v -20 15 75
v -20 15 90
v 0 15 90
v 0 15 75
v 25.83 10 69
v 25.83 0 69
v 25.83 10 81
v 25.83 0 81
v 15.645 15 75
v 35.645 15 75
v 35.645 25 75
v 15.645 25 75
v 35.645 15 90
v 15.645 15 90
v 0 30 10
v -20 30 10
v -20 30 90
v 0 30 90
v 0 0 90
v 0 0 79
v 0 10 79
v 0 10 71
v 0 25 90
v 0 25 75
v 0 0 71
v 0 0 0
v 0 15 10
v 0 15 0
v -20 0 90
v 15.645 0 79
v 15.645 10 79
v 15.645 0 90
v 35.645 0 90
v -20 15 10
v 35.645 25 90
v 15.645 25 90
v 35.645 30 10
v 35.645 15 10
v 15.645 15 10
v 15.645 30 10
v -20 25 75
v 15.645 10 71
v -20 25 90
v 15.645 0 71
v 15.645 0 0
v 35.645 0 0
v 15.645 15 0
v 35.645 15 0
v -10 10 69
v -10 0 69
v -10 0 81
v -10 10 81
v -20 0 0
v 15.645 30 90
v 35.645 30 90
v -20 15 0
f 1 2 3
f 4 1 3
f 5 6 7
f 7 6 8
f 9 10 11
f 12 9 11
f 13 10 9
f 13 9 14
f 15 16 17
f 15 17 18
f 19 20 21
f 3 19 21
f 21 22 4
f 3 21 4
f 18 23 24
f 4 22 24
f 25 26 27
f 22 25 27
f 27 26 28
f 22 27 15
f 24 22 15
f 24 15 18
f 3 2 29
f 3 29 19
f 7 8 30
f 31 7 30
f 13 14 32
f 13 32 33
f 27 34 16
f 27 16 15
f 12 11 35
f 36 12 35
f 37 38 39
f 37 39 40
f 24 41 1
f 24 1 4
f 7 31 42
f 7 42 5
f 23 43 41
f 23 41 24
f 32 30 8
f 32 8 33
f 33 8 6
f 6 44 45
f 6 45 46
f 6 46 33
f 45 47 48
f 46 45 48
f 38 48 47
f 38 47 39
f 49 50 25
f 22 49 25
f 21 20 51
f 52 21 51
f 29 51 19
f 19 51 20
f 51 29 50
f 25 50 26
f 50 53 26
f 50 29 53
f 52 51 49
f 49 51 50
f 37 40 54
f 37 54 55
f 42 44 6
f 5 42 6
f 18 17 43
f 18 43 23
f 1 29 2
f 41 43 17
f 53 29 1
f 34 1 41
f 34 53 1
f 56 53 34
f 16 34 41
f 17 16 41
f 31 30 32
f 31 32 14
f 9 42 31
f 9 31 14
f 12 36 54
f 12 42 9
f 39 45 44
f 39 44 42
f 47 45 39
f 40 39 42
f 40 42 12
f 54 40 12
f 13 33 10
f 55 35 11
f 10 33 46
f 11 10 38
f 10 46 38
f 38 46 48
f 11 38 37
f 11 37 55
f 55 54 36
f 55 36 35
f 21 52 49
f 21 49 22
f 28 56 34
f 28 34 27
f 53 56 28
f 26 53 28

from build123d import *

# Parameters (mm, degrees)
F0_W      = 20
F0_H      = 30
F1_DEPTH  = 90
F2_W      = 20
F2_H      = 10
F3_DEPTH  = 15
F4_W      = 20
F4_H      = 15
F5_DEPTH  = 10
F7_DEPTH  = 10
F8_W      = 20
F8_H      = 30
F9_DEPTH  = 90
F10_W     = 10
F10_H     = 15
F10_W_2   = 15
F10_H_2   = 10
F11_DEPTH = 55.646162
F13_DEPTH = 10


with BuildPart() as f1:
    # F0 (on Top) → F1 (new body)
    with BuildSketch(Plane.XY):
        with Locations((-10, 15)):
            Rectangle(F0_W, F0_H)
    extrude(amount=F1_DEPTH)

    # F2 (on face) → F3 (cut)
    with BuildSketch(Plane.XY.offset(90)):
        with Locations((-10, 20)):
            Rectangle(F2_W, F2_H)
    extrude(amount=-F3_DEPTH, mode=Mode.SUBTRACT)

    # F4 (on face) → F5 (cut)
    with BuildSketch(Plane(origin=(0, 0, 0), x_dir=(1, 0, 0), z_dir=(0, 0, -1))):
        with Locations((-10, -22.5)):
            Rectangle(F4_W, F4_H)
    extrude(amount=-F5_DEPTH, mode=Mode.SUBTRACT)

    # F6 (on face) → F7 (cut)
    with BuildSketch(Plane.XZ):
        Polygon((0, 71), (0, 79), (-10, 81), (-10, 69), align=None)
    extrude(amount=-F7_DEPTH, mode=Mode.SUBTRACT)


with BuildPart() as f9:
    # F8 (on Top) → F9 (new body)
    with BuildSketch(Plane.XY):
        with Locations((25.645162, 15)):
            Rectangle(F8_W, F8_H)
    extrude(amount=F9_DEPTH)

    # F10 (on face) → F11 (cut, through all)
    with BuildSketch(Plane.YZ.offset(35.645162)):
        with Locations((20, 82.5)):
            Rectangle(F10_W, F10_H)
        with Locations((22.5, 5)):
            Rectangle(F10_W_2, F10_H_2)
    extrude(amount=-F11_DEPTH, mode=Mode.SUBTRACT)

    # F12 (on face) → F13 (cut)
    with BuildSketch(Plane.XZ):
        Polygon((15.645162, 79), (15.645162, 71), (25.829555, 69), (25.829555, 81), align=None)
    extrude(amount=-F13_DEPTH, mode=Mode.SUBTRACT)


solid = Compound([f1.part, f9.part])
